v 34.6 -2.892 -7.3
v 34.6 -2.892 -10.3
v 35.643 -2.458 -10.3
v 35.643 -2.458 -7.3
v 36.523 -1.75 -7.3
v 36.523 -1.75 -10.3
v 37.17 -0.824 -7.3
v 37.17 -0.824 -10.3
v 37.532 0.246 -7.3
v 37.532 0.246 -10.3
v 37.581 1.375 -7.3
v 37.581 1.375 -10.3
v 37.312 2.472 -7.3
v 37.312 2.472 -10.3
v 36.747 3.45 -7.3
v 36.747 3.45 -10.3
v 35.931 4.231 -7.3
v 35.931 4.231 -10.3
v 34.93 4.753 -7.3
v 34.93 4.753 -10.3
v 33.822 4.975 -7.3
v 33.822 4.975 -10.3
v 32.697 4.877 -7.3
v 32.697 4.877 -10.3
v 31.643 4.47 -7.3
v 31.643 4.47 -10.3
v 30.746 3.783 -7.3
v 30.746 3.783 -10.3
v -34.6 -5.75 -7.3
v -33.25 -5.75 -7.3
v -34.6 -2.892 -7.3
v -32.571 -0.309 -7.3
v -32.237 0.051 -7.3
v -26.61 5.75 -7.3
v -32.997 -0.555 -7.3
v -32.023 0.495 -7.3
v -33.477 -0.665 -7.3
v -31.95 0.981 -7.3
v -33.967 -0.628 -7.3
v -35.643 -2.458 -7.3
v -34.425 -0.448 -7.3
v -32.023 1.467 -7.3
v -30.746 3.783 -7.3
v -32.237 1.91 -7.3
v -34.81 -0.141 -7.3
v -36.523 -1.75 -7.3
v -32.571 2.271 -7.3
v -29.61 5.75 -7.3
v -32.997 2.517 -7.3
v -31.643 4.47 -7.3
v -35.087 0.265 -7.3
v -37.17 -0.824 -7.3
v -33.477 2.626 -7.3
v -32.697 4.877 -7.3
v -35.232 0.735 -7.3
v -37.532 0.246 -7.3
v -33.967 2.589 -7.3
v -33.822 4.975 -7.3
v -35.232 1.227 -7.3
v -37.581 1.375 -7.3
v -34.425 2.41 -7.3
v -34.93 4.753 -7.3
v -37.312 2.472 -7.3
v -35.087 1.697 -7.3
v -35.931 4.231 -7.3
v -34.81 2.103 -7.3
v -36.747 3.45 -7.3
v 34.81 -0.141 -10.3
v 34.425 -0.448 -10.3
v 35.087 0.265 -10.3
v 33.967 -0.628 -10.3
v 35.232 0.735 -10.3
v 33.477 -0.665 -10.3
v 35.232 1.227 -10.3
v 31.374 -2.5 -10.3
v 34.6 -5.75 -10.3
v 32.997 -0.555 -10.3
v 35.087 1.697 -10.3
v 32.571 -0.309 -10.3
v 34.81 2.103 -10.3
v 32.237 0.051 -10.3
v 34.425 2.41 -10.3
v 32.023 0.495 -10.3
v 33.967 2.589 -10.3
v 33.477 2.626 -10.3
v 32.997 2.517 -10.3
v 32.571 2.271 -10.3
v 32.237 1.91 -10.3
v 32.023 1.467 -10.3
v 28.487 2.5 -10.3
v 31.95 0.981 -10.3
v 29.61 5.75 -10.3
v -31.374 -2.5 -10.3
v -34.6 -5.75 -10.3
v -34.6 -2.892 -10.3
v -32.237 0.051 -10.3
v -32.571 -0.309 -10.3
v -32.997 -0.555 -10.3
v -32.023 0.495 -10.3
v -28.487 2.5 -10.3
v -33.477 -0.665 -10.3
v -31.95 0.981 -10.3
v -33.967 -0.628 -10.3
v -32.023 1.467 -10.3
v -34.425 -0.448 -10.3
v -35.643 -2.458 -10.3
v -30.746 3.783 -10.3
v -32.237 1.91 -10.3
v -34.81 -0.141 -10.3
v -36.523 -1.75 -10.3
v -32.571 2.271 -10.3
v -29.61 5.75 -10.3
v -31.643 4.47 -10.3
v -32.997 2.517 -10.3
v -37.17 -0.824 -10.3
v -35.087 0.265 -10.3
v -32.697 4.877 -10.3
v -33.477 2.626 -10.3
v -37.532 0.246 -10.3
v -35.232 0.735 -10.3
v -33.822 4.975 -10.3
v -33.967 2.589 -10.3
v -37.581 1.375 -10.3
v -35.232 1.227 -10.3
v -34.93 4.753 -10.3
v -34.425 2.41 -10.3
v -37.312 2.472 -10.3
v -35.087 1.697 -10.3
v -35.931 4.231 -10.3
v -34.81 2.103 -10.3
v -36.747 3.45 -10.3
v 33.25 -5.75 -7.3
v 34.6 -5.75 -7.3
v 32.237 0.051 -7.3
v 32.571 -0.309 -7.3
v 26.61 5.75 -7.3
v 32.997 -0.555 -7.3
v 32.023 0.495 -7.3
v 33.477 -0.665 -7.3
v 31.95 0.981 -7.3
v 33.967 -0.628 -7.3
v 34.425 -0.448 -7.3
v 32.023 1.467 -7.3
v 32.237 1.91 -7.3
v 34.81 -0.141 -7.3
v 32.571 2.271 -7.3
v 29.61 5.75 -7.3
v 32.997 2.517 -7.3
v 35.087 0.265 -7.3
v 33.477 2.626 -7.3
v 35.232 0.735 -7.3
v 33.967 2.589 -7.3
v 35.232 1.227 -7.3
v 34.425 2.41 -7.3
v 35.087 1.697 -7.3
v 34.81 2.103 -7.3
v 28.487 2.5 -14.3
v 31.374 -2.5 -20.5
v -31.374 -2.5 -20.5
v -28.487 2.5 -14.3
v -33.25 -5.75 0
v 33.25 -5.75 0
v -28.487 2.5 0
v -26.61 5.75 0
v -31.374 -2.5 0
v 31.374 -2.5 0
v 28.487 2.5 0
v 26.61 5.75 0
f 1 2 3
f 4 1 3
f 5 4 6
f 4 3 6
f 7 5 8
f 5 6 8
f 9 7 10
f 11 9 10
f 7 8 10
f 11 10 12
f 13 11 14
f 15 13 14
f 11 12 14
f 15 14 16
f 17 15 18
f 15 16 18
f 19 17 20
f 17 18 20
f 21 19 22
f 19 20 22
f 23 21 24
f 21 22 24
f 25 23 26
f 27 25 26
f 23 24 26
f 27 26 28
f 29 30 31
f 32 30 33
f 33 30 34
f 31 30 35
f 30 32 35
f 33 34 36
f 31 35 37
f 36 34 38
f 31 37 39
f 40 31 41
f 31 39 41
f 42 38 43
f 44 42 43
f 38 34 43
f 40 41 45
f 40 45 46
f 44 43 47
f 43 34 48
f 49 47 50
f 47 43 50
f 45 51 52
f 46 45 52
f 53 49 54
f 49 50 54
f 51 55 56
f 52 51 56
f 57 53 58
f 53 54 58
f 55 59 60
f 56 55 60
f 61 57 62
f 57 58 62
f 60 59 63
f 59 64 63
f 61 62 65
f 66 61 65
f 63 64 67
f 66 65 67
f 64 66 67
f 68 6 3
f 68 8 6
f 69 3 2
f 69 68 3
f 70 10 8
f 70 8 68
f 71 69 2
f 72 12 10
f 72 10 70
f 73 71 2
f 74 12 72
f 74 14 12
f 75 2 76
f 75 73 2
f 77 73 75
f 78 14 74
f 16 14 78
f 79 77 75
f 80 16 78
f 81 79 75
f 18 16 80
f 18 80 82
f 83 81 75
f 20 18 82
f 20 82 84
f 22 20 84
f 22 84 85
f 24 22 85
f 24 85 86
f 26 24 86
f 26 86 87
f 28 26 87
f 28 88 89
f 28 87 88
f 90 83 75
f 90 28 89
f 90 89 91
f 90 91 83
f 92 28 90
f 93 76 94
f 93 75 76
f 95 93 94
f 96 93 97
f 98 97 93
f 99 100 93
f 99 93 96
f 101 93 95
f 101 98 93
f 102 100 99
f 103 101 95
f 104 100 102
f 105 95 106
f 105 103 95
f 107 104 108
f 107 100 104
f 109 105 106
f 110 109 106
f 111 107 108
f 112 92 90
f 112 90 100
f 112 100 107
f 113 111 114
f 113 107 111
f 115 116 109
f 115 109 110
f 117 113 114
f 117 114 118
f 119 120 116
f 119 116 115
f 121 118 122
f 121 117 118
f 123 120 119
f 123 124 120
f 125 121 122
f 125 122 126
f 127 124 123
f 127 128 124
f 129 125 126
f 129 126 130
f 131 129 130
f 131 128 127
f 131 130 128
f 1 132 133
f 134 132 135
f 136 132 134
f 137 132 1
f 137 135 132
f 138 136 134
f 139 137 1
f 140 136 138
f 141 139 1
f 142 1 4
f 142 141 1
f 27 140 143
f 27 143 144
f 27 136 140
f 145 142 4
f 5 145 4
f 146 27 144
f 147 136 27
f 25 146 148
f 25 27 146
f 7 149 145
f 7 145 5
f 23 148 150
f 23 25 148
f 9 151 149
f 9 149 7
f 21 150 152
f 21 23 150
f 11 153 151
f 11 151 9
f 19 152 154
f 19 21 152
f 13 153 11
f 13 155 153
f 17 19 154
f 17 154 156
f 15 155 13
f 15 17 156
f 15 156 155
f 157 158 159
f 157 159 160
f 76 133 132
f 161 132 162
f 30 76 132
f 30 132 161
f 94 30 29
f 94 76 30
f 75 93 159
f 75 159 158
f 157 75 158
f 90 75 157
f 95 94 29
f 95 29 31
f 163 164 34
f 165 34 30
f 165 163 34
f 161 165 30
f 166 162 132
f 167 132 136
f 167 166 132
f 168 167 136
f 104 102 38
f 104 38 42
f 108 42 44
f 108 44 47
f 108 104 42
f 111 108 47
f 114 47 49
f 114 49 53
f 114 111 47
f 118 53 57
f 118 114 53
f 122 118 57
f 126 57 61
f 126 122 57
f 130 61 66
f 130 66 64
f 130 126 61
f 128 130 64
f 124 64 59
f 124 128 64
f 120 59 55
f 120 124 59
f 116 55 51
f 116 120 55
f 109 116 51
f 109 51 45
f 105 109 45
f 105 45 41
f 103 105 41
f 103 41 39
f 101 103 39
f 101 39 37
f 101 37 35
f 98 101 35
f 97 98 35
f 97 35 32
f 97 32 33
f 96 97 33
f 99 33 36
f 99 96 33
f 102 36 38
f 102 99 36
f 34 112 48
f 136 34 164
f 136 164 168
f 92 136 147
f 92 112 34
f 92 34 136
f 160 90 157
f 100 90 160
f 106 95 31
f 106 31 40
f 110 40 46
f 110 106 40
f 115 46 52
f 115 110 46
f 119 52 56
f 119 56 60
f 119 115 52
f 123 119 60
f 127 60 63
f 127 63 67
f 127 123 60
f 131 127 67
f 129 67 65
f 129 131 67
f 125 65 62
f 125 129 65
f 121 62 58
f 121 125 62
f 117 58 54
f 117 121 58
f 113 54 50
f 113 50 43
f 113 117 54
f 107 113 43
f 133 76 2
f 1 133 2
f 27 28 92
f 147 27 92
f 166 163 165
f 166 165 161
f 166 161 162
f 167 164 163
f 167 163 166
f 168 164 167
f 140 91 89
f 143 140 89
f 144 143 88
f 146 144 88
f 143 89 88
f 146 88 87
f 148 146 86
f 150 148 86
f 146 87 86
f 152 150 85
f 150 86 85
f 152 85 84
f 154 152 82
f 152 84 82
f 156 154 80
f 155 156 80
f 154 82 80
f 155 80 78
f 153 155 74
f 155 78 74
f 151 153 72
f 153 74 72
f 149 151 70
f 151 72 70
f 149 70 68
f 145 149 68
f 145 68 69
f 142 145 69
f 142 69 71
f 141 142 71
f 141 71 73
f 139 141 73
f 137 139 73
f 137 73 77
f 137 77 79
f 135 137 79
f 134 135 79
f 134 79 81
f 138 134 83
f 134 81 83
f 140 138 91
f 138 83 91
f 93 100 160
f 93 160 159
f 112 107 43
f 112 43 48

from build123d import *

# Parameters (mm, degrees)
BOSS_EXTRUDE1_DEPTH     = 10.3
BOSS_EXTRUDE2_DEPTH     = 20.5
CUT_EXTRUDE1_DEPTH      = 40.4825911
CUT_EXTRUDE1_DEPTH_BACK = 40.4825911
SKETCH3_R               = 1.65
BOSS_EXTRUDE3_DEPTH     = 3


with BuildPart() as part:
    # Sketch1 → Boss-Extrude1 (new body)
    with BuildSketch(Plane.XY):
        Polygon((-33.25, -5.75), (33.25, -5.75), (26.610471904, 5.75), (-26.610471904, 5.75), align=None)
    extrude(amount=-BOSS_EXTRUDE1_DEPTH)

    # Sketch1<5> → Boss-Extrude2 (add)
    with BuildSketch(Plane.XY):
        Polygon((-28.486860279, 2.5), (-31.373611625, -2.5), (31.373611625, -2.5), (28.486860279, 2.5), align=None)
    extrude(amount=-BOSS_EXTRUDE2_DEPTH)

    # Sketch2 → Cut-Extrude1 (cut, two sides: drawn at the far end of the back side and taken through both)
    with BuildSketch(Plane(origin=(0, 0, 0), x_dir=(0, 0, -1), z_dir=(1, 0, 0)).offset(-CUT_EXTRUDE1_DEPTH_BACK)):
        Polygon((20.5, -2.5), (14.3, 2.5), (20.5, 2.5), align=None)
    extrude(amount=CUT_EXTRUDE1_DEPTH + CUT_EXTRUDE1_DEPTH_BACK, mode=Mode.SUBTRACT)

    # Sketch3 → Boss-Extrude3 (add)
    with BuildSketch(Plane(origin=(0, 0, -10.3), x_dir=(-1, 0, 0), z_dir=(0, 0, -1))):
        with BuildLine():
            Line((-33.25, -5.75), (-34.6, -5.75))
            Line((-34.6, -5.75), (-34.6, -2.892116168))
            ThreePointArc((-34.6, -2.892116168), (-37.064101615, 2.980867179), (-30.745898034, 3.783384256))
            Line((-30.745898034, 3.783384256), (-29.610471904, 5.75))
            Line((-29.610471904, 5.75), (-26.610471904, 5.75))
            Line((-26.610471904, 5.75), (-33.25, -5.75))
        make_face()
        with Locations((-33.6, 0.980867179)):
            Circle(SKETCH3_R, mode=Mode.SUBTRACT)
    boss_extrude3 = extrude(amount=-BOSS_EXTRUDE3_DEPTH)

    # Mirror1: Boss-Extrude3 across plane
    add(boss_extrude3.mirror(Plane(origin=(0, 0, 0), x_dir=(0, 0, 1), z_dir=(1, 0, 0))))


solid = part.part
